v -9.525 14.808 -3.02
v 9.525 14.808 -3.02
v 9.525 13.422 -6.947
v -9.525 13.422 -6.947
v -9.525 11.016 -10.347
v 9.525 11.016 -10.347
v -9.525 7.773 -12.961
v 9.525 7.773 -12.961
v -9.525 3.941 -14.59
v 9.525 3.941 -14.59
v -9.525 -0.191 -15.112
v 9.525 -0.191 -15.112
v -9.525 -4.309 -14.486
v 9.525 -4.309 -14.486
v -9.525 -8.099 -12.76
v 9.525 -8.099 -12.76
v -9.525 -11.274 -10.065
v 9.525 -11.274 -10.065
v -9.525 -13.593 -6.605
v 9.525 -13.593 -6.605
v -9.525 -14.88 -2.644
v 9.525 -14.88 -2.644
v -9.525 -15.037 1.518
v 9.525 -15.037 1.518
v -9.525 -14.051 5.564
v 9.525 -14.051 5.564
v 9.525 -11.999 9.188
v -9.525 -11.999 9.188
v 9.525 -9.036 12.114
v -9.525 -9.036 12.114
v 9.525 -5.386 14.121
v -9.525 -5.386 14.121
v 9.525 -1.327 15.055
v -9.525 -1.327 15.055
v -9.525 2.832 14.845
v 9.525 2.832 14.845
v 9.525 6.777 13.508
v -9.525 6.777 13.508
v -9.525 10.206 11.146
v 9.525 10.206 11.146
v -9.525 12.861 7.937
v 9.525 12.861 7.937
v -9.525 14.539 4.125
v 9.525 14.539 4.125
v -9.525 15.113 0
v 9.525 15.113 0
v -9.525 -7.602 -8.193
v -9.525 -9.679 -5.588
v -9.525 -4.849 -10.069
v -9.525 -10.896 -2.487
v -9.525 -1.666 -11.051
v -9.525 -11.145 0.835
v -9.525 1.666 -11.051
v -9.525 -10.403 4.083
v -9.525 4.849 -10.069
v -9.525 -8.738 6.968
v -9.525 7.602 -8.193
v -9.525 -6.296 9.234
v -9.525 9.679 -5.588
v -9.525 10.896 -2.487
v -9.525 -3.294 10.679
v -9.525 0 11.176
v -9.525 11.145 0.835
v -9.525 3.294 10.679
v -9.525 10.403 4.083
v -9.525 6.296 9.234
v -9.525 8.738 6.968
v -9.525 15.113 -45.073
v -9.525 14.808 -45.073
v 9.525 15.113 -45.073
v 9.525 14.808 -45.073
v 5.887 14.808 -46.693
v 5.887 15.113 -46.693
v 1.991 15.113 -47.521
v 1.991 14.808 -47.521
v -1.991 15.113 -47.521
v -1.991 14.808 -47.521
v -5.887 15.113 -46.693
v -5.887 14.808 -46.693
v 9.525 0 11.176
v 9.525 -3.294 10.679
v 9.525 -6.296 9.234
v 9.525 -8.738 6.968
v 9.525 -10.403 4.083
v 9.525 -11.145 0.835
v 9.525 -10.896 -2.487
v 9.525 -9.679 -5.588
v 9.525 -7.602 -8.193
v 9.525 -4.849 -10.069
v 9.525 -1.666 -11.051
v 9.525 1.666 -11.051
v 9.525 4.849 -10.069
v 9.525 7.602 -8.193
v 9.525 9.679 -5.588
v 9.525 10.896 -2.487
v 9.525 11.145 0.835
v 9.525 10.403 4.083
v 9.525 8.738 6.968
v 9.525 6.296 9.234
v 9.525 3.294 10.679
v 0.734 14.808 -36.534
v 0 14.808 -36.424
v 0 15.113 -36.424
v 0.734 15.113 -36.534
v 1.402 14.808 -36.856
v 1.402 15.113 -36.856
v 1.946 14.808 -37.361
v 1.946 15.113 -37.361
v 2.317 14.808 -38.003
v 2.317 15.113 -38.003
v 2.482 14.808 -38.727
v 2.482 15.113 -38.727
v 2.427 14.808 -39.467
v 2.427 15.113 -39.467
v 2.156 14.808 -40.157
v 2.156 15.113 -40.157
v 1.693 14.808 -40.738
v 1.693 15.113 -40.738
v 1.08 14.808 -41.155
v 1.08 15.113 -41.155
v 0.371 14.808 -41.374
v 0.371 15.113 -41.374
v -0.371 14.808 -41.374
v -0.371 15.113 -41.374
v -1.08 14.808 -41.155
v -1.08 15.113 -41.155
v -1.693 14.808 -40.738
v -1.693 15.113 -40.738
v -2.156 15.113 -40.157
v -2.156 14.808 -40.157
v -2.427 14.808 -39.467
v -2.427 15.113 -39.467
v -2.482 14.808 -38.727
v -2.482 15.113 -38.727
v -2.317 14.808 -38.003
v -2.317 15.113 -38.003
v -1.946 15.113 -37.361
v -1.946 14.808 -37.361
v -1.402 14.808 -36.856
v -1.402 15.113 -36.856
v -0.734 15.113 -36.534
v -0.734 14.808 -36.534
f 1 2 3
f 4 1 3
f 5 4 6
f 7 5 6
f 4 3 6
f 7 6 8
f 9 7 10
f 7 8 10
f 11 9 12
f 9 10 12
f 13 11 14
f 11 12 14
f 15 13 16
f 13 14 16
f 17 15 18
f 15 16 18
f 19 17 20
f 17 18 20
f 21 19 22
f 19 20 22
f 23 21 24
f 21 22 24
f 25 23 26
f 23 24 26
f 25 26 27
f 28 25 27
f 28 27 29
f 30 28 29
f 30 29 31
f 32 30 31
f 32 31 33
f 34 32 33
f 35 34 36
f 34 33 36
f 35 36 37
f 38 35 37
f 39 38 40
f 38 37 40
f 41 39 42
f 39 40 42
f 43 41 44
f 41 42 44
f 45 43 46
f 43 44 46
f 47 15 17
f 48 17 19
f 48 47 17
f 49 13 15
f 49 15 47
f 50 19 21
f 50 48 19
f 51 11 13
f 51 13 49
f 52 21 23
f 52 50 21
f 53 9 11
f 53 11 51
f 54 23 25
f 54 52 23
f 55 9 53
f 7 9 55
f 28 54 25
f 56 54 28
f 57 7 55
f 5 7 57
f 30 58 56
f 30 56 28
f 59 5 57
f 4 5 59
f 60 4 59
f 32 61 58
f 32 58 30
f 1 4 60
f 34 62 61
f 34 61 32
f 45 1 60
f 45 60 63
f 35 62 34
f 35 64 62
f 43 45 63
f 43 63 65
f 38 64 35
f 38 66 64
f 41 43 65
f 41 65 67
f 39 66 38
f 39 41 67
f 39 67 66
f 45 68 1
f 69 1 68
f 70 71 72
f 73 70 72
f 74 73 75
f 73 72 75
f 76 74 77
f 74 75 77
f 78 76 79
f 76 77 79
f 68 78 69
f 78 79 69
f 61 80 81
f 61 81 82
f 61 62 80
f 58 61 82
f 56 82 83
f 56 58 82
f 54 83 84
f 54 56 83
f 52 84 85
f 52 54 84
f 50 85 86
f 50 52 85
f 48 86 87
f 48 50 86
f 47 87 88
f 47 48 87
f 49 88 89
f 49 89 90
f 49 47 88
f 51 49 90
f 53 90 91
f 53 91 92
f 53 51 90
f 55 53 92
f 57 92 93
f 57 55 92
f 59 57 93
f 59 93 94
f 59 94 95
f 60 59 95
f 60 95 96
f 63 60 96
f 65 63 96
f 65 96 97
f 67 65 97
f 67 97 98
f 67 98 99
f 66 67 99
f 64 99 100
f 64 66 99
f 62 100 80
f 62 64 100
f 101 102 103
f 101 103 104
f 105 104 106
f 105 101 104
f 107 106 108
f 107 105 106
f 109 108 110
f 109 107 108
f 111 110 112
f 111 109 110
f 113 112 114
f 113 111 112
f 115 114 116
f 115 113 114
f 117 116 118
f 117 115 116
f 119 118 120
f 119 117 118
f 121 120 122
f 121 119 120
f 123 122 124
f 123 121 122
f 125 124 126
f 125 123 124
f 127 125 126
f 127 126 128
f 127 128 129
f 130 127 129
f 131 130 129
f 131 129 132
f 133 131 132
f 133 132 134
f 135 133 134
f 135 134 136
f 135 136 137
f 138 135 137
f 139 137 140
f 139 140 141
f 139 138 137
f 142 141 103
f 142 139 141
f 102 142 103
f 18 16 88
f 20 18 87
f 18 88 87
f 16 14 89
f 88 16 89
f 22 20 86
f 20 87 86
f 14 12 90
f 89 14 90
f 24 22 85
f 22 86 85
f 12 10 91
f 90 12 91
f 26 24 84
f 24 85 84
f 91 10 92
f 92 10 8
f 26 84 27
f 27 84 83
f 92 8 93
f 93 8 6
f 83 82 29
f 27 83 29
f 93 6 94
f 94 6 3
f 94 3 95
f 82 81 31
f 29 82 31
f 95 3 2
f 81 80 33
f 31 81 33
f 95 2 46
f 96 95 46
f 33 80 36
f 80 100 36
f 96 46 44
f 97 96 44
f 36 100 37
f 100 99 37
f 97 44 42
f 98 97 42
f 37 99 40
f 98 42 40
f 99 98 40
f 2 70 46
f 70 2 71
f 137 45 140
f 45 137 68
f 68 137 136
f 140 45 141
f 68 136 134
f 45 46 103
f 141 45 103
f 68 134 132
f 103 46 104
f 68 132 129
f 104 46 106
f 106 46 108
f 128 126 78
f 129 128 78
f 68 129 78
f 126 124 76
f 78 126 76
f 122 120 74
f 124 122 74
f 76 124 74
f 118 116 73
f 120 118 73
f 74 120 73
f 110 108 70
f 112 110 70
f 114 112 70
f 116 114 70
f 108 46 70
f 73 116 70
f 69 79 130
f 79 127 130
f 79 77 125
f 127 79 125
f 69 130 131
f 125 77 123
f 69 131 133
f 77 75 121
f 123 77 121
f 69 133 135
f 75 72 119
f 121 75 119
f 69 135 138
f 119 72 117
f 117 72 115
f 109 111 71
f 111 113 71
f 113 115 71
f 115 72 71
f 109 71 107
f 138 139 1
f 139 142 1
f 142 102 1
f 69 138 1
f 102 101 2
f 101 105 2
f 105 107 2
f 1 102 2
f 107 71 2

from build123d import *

# Parameters (mm, degrees)
SKETCH1_R           = 11.176
BOSS_EXTRUDE1_DEPTH = 9.525
ONEHOLE_START       = -0.3048
SKETCH2_R           = 2.4892
ONEHOLE_DEPTH       = 0.3048


with BuildPart() as part:
    # Sketch1 → Boss-Extrude1 (new, symmetric)
    with BuildSketch(Plane(origin=(0, 0, 0), x_dir=(0, 0, -1), z_dir=(1, 0, 0))):
        with BuildLine():
            Line((0, 15.113), (47.625, 15.113))
            Line((47.625, 15.113), (47.625, 14.8082))
            Line((47.625, 14.8082), (3.019930754, 14.8082))
            ThreePointArc((3.019930754, 14.8082), (-1.517636715, -15.036606924), (0, 15.113))
        make_face()
        with Locations(Location((0, 0, 0), (0, 0, 180))):
            Circle(SKETCH1_R, mode=Mode.SUBTRACT)
    extrude(amount=BOSS_EXTRUDE1_DEPTH, both=True)

    # Sketch2 → OneHole (cut)
    with BuildSketch(Plane(origin=(0, 15.113, 0), x_dir=(1, 0, 0), z_dir=(0, 1, 0)).offset(ONEHOLE_START)):
        with Locations(Location((0, 38.9128, 0), (0, 0, 270))):
            Circle(SKETCH2_R)
        with BuildLine():
            Line((-9.525, 45.072783942), (-9.525, 48.26))
            Line((-9.525, 48.26), (9.525, 48.26))
            Line((9.525, 48.26), (9.525, 45.072783942))
            ThreePointArc((9.525, 45.072783942), (0, 47.625), (-9.525, 45.072783942))
        make_face()
    extrude(amount=ONEHOLE_DEPTH, mode=Mode.SUBTRACT)


solid = part.part
